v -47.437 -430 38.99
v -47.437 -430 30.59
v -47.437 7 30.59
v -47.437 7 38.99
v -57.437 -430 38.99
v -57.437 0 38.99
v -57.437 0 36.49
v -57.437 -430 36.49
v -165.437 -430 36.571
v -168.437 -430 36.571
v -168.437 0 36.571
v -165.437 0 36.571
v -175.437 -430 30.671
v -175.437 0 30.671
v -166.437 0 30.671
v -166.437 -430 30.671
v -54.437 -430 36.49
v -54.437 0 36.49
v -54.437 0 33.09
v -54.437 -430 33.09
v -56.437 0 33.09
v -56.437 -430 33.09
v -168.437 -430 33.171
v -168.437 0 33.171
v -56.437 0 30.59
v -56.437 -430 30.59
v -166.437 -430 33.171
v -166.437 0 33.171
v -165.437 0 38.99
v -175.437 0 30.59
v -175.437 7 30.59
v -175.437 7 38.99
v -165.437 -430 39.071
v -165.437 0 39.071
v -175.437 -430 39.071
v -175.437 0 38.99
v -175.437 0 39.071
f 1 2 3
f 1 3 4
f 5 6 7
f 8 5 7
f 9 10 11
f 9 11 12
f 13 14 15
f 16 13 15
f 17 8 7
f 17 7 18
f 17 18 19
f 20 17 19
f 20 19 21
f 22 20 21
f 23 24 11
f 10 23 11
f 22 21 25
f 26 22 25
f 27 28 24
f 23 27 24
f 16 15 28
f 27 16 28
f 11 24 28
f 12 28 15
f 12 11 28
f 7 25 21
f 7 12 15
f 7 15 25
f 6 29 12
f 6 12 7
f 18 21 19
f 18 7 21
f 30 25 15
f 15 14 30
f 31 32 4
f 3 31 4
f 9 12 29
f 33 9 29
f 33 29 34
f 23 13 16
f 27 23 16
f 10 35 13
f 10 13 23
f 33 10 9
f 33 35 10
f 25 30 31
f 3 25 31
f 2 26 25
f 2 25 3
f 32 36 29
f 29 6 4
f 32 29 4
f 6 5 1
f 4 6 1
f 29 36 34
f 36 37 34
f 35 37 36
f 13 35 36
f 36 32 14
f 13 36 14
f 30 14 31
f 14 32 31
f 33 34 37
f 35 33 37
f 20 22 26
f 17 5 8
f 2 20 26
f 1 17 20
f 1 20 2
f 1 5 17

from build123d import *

# Parameters (mm, degrees)
F1_DEPTH = 430
F2_W     = 128
F2_H     = 8.4
F3_DEPTH = 7
F5_DEPTH = 430


with BuildPart() as f1:
    # F0 (on Front) → F1 (new body)
    with BuildSketch(Plane.XZ):
        Polygon((-47.436745, 38.990075), (-57.436745, 38.990075), (-57.436745, 36.490075), (-54.436745, 36.490075), (-54.436745, 33.090075), (-56.436745, 33.090075), (-56.436745, 30.590075), (-47.436745, 30.590075), align=None)
    extrude(amount=F1_DEPTH)

    # F2 (on Front) → F3 (join)
    with BuildSketch(Plane.XZ):
        with Locations((-111.436745, 34.790075)):
            Rectangle(F2_W, F2_H)
    extrude(amount=-F3_DEPTH)

    # F4 (on Front) → F5 (join)
    with BuildSketch(Plane.XZ):
        Polygon((-165.436745, 36.57085), (-165.436745, 39.07085), (-175.436745, 39.07085), (-175.436745, 30.67085), (-166.436745, 30.67085), (-166.436745, 33.17085), (-168.436745, 33.17085), (-168.436745, 36.57085), align=None)
    extrude(amount=F5_DEPTH)


solid = f1.part
